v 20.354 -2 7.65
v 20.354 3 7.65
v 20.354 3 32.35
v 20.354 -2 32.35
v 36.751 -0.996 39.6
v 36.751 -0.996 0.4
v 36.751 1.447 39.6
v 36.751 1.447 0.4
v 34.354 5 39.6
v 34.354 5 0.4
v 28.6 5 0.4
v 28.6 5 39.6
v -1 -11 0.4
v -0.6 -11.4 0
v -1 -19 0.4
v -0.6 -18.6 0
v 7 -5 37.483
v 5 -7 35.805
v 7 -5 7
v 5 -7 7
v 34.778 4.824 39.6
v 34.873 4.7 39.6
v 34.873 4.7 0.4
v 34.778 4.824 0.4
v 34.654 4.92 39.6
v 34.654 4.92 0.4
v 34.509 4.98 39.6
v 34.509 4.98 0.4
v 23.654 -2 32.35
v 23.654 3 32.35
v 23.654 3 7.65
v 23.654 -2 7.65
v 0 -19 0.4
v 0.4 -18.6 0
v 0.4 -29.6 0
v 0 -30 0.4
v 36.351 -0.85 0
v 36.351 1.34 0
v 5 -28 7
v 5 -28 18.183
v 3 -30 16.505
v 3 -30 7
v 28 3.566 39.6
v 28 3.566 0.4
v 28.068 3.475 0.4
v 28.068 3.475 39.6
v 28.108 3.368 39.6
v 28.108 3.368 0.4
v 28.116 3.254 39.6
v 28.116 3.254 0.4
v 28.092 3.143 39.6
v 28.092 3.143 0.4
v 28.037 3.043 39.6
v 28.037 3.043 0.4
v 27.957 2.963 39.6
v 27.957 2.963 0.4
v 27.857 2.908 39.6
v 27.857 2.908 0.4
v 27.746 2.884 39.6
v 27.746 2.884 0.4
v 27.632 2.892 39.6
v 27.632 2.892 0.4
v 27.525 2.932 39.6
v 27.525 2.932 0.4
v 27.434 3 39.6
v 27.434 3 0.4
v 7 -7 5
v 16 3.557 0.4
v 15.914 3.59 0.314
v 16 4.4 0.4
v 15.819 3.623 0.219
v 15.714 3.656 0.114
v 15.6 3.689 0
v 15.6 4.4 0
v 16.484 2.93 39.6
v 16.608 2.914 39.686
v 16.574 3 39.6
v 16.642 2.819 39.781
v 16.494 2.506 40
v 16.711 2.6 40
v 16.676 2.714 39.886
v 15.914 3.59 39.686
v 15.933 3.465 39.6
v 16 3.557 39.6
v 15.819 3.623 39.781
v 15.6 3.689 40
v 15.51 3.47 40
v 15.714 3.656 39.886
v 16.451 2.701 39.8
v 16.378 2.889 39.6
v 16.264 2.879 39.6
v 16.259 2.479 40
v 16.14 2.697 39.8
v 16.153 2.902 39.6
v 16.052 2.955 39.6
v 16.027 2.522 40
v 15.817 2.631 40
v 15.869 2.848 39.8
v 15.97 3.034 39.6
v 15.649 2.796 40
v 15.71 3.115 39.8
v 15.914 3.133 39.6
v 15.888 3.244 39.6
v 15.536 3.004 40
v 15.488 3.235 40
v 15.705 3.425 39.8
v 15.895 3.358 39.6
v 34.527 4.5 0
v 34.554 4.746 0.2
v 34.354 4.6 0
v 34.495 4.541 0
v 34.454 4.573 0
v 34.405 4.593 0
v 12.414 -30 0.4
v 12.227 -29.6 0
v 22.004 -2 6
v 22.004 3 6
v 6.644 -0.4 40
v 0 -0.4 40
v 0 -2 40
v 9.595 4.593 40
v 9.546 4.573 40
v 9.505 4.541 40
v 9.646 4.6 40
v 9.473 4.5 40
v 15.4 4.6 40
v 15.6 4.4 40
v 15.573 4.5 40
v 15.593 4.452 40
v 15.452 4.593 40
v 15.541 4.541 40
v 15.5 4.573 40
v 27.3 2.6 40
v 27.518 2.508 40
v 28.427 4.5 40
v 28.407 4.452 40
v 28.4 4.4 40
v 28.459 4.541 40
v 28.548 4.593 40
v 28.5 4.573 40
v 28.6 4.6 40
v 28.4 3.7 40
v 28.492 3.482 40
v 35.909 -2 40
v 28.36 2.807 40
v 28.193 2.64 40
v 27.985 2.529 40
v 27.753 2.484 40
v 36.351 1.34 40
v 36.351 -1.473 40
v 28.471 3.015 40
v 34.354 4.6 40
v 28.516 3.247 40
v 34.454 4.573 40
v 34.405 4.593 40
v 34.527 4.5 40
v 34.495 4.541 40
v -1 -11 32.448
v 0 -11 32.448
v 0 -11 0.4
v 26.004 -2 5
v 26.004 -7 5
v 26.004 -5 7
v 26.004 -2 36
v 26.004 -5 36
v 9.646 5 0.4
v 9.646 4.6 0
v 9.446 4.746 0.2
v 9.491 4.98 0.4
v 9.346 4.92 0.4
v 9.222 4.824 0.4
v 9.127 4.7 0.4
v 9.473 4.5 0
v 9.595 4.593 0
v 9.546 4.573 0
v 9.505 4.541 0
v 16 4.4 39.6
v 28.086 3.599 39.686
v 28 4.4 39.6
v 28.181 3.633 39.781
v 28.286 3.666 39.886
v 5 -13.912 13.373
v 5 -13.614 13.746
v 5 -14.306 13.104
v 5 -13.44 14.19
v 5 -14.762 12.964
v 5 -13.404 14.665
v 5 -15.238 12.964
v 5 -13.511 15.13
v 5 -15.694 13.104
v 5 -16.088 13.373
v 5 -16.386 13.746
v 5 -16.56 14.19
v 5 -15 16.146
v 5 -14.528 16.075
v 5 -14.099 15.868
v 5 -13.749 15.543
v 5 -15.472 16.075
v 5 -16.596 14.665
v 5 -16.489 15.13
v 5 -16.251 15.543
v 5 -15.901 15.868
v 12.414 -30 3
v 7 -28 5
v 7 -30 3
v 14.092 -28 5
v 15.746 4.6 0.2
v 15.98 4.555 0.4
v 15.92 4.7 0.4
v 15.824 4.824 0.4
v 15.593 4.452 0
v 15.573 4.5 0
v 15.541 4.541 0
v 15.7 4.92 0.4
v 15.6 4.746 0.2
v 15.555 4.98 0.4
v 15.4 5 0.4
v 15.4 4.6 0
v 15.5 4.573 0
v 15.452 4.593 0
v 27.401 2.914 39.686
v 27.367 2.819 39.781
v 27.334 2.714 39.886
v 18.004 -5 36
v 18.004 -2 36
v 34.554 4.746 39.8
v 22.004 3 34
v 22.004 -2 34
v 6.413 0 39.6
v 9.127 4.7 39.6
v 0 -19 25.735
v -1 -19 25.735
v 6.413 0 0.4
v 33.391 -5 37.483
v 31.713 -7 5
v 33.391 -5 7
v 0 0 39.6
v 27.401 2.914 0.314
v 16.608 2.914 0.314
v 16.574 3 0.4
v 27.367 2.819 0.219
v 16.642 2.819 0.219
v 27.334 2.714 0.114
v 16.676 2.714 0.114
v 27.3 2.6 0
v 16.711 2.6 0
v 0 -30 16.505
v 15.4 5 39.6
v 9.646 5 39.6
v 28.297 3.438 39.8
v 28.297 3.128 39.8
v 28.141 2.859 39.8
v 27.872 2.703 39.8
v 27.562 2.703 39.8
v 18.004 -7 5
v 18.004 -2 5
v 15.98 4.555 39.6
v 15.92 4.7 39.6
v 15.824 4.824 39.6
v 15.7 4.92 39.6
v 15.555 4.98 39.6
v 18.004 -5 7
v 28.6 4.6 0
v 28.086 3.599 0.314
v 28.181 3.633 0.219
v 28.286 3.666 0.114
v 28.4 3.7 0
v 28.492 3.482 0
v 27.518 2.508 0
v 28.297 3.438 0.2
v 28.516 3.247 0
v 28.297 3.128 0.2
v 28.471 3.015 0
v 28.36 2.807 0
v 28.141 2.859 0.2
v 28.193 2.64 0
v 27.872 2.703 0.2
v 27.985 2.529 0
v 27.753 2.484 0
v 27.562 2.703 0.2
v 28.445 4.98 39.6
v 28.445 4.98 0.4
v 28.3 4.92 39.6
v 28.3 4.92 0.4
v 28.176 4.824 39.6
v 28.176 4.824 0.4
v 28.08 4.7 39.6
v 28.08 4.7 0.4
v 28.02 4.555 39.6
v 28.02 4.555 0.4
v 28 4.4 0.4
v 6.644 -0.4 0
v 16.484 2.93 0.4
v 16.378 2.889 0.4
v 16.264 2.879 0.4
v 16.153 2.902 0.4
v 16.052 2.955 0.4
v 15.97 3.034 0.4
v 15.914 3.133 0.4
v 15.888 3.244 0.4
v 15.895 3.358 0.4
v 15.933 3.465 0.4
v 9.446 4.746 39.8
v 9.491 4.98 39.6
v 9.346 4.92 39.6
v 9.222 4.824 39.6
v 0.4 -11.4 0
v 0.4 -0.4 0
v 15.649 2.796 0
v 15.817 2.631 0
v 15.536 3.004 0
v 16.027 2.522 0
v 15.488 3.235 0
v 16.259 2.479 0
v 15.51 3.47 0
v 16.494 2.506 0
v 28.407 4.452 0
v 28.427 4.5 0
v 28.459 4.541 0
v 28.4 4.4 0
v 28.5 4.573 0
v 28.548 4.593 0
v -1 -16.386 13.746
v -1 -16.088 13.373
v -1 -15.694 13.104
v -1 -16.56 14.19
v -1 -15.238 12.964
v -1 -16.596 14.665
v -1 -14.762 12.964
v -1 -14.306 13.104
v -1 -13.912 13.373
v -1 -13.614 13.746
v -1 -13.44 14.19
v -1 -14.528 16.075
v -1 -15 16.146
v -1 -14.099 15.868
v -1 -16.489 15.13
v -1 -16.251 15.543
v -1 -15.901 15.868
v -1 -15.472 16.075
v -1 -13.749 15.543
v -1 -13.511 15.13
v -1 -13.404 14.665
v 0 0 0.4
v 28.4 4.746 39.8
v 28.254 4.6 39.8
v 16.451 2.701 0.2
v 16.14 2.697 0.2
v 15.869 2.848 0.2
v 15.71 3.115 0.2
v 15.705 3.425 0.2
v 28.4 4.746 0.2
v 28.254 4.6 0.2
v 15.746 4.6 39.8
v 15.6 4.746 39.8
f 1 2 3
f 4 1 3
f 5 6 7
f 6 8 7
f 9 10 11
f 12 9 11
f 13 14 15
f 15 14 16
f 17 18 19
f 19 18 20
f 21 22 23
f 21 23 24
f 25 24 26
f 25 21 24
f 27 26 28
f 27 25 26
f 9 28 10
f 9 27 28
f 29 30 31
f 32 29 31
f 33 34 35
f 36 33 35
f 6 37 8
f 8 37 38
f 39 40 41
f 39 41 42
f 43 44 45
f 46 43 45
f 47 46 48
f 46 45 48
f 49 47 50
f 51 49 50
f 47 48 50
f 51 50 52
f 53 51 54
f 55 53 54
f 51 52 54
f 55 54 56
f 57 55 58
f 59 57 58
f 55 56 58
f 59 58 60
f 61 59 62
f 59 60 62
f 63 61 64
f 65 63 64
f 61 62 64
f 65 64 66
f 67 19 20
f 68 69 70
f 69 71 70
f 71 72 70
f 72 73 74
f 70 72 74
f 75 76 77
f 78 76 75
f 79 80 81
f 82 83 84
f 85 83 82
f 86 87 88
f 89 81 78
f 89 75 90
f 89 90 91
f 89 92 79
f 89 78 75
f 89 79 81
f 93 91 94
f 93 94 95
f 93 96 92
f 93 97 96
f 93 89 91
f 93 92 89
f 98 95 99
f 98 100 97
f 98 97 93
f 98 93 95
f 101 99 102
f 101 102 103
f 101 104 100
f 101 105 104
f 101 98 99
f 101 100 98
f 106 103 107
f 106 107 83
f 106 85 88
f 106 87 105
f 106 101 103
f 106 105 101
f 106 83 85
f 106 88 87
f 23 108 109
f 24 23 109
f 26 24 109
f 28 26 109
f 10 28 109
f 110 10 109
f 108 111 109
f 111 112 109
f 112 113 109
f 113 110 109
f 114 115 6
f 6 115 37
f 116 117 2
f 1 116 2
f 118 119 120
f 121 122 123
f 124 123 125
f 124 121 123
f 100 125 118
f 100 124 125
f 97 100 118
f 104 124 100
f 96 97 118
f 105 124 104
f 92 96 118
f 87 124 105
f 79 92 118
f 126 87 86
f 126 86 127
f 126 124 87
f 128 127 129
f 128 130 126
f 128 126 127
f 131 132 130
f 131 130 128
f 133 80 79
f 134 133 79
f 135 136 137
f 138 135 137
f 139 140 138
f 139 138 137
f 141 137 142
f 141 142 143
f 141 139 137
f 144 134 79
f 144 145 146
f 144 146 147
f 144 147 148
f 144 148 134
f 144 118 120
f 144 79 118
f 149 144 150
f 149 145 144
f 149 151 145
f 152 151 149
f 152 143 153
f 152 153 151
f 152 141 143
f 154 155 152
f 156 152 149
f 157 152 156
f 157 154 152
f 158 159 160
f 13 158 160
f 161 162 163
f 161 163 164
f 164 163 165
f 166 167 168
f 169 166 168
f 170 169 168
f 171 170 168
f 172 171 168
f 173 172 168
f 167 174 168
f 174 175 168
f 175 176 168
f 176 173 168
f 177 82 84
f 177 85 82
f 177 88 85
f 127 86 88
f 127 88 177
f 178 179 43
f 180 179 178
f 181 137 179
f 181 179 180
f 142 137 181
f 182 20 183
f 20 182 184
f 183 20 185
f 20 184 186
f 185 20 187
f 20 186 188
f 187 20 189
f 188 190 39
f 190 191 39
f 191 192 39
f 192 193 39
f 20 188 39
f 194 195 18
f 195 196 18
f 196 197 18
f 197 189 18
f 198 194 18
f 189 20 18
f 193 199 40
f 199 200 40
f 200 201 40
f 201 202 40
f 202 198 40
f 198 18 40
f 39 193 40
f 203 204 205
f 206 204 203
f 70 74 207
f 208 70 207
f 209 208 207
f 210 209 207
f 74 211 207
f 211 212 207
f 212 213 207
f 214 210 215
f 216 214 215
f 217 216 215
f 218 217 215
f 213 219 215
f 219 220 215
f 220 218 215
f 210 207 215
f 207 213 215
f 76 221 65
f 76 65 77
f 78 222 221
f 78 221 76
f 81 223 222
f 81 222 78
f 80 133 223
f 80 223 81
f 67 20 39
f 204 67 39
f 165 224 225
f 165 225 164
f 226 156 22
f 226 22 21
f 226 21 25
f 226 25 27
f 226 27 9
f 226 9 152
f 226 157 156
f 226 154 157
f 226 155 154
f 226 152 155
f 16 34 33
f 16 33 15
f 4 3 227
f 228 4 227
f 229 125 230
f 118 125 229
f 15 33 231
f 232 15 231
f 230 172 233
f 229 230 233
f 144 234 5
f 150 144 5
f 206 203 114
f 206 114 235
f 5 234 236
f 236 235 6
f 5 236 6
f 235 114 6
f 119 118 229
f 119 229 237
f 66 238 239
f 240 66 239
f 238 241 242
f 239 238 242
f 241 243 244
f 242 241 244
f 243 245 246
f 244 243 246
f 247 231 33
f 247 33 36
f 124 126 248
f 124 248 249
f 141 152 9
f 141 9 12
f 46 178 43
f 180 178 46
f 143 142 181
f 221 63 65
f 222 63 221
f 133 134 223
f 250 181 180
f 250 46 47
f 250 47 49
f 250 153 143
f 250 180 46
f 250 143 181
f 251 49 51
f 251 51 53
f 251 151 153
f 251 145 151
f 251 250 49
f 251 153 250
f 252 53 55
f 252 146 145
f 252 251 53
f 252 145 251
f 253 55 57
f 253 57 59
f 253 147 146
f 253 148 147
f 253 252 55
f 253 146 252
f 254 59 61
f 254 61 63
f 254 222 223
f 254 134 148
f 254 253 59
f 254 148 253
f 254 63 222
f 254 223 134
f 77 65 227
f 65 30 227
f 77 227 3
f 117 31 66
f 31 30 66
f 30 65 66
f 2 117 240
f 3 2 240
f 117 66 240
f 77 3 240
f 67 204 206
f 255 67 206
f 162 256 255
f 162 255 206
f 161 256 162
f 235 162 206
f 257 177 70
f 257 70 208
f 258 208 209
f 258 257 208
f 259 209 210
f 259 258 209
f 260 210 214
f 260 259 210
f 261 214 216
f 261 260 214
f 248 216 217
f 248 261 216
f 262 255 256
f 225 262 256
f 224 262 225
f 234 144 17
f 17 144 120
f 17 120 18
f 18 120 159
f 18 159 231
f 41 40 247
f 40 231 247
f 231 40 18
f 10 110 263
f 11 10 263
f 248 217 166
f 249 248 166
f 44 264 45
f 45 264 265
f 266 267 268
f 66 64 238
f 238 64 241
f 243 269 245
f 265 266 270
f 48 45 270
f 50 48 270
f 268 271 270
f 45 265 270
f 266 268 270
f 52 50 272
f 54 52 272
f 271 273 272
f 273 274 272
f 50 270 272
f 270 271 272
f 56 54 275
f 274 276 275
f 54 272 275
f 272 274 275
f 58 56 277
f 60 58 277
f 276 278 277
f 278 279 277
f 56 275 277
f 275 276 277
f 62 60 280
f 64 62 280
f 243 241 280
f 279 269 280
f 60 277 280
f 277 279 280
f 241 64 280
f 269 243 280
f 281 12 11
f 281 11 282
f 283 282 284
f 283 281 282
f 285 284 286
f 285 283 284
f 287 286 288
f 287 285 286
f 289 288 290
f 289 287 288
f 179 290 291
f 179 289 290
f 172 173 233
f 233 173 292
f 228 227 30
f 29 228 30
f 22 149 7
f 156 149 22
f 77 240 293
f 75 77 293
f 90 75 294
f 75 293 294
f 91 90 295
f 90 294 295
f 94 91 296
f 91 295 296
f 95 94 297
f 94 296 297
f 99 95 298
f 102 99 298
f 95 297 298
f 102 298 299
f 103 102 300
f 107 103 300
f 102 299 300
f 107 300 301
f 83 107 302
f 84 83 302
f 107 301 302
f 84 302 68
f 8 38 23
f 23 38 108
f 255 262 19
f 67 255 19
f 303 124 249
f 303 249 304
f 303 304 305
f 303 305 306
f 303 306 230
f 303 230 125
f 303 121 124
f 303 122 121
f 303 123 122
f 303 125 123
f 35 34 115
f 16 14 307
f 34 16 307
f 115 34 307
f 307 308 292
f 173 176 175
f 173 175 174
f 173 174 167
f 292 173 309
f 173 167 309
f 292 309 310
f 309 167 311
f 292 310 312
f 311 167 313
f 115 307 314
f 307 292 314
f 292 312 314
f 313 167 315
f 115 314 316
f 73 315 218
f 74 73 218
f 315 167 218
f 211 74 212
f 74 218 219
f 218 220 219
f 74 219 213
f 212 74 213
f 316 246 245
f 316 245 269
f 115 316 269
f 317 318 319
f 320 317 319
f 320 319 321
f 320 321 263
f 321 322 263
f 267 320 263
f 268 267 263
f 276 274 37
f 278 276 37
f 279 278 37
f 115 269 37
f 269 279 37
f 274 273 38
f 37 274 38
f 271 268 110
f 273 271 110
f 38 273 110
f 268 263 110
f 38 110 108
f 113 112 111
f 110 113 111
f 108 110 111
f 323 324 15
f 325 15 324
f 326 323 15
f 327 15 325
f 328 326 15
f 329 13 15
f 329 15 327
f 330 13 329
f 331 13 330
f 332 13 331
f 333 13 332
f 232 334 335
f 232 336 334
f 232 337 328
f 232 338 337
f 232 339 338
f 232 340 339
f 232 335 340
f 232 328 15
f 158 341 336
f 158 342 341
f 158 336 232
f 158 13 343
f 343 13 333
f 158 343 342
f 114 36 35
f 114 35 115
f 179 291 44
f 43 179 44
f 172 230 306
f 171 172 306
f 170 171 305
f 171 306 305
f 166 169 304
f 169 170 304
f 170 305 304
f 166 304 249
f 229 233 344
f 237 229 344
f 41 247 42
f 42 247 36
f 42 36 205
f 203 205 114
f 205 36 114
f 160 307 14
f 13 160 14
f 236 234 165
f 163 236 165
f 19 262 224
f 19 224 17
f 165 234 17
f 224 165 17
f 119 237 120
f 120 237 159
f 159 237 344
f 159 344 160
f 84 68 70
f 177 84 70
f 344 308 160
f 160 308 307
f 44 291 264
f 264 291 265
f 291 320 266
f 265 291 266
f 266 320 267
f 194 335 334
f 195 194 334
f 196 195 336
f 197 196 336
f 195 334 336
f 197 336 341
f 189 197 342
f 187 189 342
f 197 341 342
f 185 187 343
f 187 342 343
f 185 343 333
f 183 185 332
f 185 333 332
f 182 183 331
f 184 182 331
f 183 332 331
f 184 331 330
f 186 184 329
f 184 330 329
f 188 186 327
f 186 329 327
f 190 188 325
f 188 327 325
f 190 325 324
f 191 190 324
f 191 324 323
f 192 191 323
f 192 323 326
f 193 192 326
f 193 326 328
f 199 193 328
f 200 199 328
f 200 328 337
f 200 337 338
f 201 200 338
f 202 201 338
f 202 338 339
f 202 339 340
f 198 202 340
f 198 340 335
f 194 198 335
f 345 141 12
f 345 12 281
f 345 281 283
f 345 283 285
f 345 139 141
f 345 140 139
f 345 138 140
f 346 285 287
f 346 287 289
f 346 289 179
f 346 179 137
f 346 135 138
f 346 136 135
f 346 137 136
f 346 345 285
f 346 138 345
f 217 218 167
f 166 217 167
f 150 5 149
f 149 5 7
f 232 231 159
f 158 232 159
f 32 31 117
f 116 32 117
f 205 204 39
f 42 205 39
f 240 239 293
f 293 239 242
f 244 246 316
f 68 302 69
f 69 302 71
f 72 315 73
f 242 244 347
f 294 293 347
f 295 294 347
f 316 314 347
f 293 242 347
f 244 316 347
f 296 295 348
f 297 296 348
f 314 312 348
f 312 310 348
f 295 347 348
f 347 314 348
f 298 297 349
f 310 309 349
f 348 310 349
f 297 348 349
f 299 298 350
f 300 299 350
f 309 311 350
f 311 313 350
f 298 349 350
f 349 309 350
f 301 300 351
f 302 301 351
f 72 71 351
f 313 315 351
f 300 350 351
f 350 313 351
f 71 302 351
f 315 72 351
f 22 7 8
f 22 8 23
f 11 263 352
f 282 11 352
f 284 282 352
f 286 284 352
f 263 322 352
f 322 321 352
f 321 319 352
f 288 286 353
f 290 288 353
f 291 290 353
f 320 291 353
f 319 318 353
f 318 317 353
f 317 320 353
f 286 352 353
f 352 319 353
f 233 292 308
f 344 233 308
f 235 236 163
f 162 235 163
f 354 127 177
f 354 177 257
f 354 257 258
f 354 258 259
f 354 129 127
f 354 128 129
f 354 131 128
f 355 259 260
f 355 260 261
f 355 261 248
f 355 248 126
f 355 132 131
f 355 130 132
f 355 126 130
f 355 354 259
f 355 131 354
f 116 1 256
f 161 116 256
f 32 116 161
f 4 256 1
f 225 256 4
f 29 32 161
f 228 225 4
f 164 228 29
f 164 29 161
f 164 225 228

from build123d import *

# Parameters (mm, degrees)
BOSS_EXTRUDE1_DEPTH = 40
CUT_EXTRUDE1_DEPTH  = 35
CUT_EXTRUDE2_DEPTH  = 38.586751346
BOSS_EXTRUDE2_DEPTH = 1
SKETCH5_R           = 1.6
CUT_EXTRUDE3_DEPTH  = 39.586751346
CHAMFER2_SIZE       = 1.3
CHAMFER2_SIZE2      = 1.671247785
FILLET1_R           = 0.6
CUT_EXTRUDE4_DEPTH  = 34
SKETCH7_W           = 8
SKETCH7_H           = 31
CUT_EXTRUDE5_DEPTH  = 3
CHAMFER3_SIZE       = 2
CHAMFER4_SIZE       = 0.4


with BuildPart() as part:
    # Sketch1 → Boss-Extrude1 (new body)
    with BuildSketch(Plane.XY):
        with BuildLine():
            Line((0, 0), (0, -30))
            Line((0, -30), (12.413762411, -30))
            Line((12.413762411, -30), (37.586751346, 0))
            Line((37.586751346, 0), (34.7, 5))
            Line((34.7, 5), (28, 5))
            Line((28, 5), (28, 3.565685425))
            ThreePointArc((28, 3.565685425), (28, 3), (27.434314575, 3))
            Line((27.434314575, 3), (16.573996535, 3))
            ThreePointArc((16.573996535, 3), (16.008373082, 2.991626918), (16, 3.557250372))
            Line((16, 3.557250372), (16, 5))
            Line((16, 5), (9.3, 5))
            Line((9.3, 5), (6.413248654, 0))
            Line((6.413248654, 0), (0, 0))
        make_face()
    extrude(amount=BOSS_EXTRUDE1_DEPTH)

    # Sketch2 → Cut-Extrude1 (cut)
    with BuildSketch(Plane.XY.offset(40)):
        Polygon((5, -5), (5, -30), (12.413762411, -30), (33.39125319, -5), align=None)
    extrude(amount=-CUT_EXTRUDE1_DEPTH, mode=Mode.SUBTRACT)

    # Sketch3 → Cut-Extrude2 (cut, through all)
    with BuildSketch(Plane.ZY):
        Polygon((40, -30), (40, -2), (16.505210327, -30), align=None)
    extrude(amount=-CUT_EXTRUDE2_DEPTH, mode=Mode.SUBTRACT)

    # Sketch4 → Boss-Extrude2 (add)
    with BuildSketch(Plane.ZY):
        Polygon((0, -11), (0, -19), (25.73530627, -19), (32.448103319, -11), align=None)
    extrude(amount=BOSS_EXTRUDE2_DEPTH)

    # Sketch5 → Cut-Extrude3 (cut, through all)
    with BuildSketch(Plane.ZY.offset(1)):
        with Locations((14.545852397, -15)):
            Circle(SKETCH5_R)
    extrude(amount=-CUT_EXTRUDE3_DEPTH, mode=Mode.SUBTRACT)

    # Chamfer2
    chamfer2_edges = [part.edges().sort_by_distance(p)[0] for p in [
        (37.586751346, 0, 20),
    ]]
    chamfer2_side = [part.faces().sort_by_distance(p)[0] for p in [
        (25.000256878, -15, 0.559792763),
    ]]
    chamfer(chamfer2_edges, length=CHAMFER2_SIZE, length2=CHAMFER2_SIZE2, reference=chamfer2_side[0])

    # Fillet1
    fillet1_edges = [part.edges().sort_by_distance(p)[0] for p in [
        (9.3, 5, 20),
        (16, 5, 20),
        (28, 5, 20),
        (34.7, 5, 20),
    ]]
    fillet(fillet1_edges, radius=FILLET1_R)

    # Sketch6 → Cut-Extrude4 (cut, through all)
    with BuildSketch(Plane(origin=(0, 3, 0), x_dir=(1, 0, 0), z_dir=(0, 1, 0))):
        Polygon((22.004155555, -6), (20.354155555, -7.65), (20.354155555, -32.35), (22.004155555, -34), (23.654155555, -32.35), (23.654155555, -7.65), align=None)
    extrude(amount=-CUT_EXTRUDE4_DEPTH, mode=Mode.SUBTRACT)

    # Sketch7 → Cut-Extrude5 (cut)
    with BuildSketch(Plane.XZ.offset(5)):
        with Locations((22.004155555, 20.5)):
            Rectangle(SKETCH7_W, SKETCH7_H)
    extrude(amount=-CUT_EXTRUDE5_DEPTH, mode=Mode.SUBTRACT)

    # Chamfer3
    chamfer3_edges = [part.edges().sort_by_distance(p)[0] for p in [
        (29.697704373, -5, 5),
        (5, -5, 21.241350553),
        (8.706881205, -30, 5),
        (5, -30, 10.752605164),
        (11.502077778, -5, 5),
        (5, -17.5, 5),
    ]]
    chamfer(chamfer3_edges, length=CHAMFER3_SIZE)

    # Chamfer4
    chamfer4_edges = [part.edges().sort_by_distance(p)[0] for p in [
        (31.476794919, 5, 0),
        (31.476794919, 5, 40),
        (7.770021787, 2.35, 0),
        (12.523205081, 5, 0),
        (28, 3.982842712, 0),
        (28.175735931, 4.824264069, 0),
        (9.346410162, 4.919615242, 0),
        (15.824264069, 4.824264069, 0),
        (34.653589838, 4.919615242, 0),
        (28, 3.982842712, 40),
        (12.523205081, 5, 40),
        (7.770021787, 2.35, 40),
        (28.175735931, 4.824264069, 40),
        (9.346410162, 4.919615242, 40),
        (15.824264069, 4.824264069, 40),
        (34.653589838, 4.919615242, 40),
        (16, 3.978625186, 0),
        (16.008373082, 2.991626918, 0),
        (22.004155555, 3, 0),
        (28, 3, 0),
        (24.582444932, -15.497928888, 0),
        (6.206881205, -30, 0),
        (0, -5.5, 0),
        (3.206624327, 0, 0),
        (28, 3, 40),
        (22.004155555, 3, 40),
        (16.008373082, 2.991626918, 40),
        (16, 3.978625186, 40),
        (3.206624327, 0, 40),
        (0, -24.5, 0),
        (-0.5, -11, 0),
        (-0.5, -19, 0),
        (-1, -15, 0),
        (35.812166267, 3.073671519, 0),
        (35.812166267, 3.073671519, 40),
        (36.751127453, 0.225742631, 0),
        (36.751127453, 0.225742631, 40),
    ]]
    chamfer(chamfer4_edges, length=CHAMFER4_SIZE)


solid = part.part
